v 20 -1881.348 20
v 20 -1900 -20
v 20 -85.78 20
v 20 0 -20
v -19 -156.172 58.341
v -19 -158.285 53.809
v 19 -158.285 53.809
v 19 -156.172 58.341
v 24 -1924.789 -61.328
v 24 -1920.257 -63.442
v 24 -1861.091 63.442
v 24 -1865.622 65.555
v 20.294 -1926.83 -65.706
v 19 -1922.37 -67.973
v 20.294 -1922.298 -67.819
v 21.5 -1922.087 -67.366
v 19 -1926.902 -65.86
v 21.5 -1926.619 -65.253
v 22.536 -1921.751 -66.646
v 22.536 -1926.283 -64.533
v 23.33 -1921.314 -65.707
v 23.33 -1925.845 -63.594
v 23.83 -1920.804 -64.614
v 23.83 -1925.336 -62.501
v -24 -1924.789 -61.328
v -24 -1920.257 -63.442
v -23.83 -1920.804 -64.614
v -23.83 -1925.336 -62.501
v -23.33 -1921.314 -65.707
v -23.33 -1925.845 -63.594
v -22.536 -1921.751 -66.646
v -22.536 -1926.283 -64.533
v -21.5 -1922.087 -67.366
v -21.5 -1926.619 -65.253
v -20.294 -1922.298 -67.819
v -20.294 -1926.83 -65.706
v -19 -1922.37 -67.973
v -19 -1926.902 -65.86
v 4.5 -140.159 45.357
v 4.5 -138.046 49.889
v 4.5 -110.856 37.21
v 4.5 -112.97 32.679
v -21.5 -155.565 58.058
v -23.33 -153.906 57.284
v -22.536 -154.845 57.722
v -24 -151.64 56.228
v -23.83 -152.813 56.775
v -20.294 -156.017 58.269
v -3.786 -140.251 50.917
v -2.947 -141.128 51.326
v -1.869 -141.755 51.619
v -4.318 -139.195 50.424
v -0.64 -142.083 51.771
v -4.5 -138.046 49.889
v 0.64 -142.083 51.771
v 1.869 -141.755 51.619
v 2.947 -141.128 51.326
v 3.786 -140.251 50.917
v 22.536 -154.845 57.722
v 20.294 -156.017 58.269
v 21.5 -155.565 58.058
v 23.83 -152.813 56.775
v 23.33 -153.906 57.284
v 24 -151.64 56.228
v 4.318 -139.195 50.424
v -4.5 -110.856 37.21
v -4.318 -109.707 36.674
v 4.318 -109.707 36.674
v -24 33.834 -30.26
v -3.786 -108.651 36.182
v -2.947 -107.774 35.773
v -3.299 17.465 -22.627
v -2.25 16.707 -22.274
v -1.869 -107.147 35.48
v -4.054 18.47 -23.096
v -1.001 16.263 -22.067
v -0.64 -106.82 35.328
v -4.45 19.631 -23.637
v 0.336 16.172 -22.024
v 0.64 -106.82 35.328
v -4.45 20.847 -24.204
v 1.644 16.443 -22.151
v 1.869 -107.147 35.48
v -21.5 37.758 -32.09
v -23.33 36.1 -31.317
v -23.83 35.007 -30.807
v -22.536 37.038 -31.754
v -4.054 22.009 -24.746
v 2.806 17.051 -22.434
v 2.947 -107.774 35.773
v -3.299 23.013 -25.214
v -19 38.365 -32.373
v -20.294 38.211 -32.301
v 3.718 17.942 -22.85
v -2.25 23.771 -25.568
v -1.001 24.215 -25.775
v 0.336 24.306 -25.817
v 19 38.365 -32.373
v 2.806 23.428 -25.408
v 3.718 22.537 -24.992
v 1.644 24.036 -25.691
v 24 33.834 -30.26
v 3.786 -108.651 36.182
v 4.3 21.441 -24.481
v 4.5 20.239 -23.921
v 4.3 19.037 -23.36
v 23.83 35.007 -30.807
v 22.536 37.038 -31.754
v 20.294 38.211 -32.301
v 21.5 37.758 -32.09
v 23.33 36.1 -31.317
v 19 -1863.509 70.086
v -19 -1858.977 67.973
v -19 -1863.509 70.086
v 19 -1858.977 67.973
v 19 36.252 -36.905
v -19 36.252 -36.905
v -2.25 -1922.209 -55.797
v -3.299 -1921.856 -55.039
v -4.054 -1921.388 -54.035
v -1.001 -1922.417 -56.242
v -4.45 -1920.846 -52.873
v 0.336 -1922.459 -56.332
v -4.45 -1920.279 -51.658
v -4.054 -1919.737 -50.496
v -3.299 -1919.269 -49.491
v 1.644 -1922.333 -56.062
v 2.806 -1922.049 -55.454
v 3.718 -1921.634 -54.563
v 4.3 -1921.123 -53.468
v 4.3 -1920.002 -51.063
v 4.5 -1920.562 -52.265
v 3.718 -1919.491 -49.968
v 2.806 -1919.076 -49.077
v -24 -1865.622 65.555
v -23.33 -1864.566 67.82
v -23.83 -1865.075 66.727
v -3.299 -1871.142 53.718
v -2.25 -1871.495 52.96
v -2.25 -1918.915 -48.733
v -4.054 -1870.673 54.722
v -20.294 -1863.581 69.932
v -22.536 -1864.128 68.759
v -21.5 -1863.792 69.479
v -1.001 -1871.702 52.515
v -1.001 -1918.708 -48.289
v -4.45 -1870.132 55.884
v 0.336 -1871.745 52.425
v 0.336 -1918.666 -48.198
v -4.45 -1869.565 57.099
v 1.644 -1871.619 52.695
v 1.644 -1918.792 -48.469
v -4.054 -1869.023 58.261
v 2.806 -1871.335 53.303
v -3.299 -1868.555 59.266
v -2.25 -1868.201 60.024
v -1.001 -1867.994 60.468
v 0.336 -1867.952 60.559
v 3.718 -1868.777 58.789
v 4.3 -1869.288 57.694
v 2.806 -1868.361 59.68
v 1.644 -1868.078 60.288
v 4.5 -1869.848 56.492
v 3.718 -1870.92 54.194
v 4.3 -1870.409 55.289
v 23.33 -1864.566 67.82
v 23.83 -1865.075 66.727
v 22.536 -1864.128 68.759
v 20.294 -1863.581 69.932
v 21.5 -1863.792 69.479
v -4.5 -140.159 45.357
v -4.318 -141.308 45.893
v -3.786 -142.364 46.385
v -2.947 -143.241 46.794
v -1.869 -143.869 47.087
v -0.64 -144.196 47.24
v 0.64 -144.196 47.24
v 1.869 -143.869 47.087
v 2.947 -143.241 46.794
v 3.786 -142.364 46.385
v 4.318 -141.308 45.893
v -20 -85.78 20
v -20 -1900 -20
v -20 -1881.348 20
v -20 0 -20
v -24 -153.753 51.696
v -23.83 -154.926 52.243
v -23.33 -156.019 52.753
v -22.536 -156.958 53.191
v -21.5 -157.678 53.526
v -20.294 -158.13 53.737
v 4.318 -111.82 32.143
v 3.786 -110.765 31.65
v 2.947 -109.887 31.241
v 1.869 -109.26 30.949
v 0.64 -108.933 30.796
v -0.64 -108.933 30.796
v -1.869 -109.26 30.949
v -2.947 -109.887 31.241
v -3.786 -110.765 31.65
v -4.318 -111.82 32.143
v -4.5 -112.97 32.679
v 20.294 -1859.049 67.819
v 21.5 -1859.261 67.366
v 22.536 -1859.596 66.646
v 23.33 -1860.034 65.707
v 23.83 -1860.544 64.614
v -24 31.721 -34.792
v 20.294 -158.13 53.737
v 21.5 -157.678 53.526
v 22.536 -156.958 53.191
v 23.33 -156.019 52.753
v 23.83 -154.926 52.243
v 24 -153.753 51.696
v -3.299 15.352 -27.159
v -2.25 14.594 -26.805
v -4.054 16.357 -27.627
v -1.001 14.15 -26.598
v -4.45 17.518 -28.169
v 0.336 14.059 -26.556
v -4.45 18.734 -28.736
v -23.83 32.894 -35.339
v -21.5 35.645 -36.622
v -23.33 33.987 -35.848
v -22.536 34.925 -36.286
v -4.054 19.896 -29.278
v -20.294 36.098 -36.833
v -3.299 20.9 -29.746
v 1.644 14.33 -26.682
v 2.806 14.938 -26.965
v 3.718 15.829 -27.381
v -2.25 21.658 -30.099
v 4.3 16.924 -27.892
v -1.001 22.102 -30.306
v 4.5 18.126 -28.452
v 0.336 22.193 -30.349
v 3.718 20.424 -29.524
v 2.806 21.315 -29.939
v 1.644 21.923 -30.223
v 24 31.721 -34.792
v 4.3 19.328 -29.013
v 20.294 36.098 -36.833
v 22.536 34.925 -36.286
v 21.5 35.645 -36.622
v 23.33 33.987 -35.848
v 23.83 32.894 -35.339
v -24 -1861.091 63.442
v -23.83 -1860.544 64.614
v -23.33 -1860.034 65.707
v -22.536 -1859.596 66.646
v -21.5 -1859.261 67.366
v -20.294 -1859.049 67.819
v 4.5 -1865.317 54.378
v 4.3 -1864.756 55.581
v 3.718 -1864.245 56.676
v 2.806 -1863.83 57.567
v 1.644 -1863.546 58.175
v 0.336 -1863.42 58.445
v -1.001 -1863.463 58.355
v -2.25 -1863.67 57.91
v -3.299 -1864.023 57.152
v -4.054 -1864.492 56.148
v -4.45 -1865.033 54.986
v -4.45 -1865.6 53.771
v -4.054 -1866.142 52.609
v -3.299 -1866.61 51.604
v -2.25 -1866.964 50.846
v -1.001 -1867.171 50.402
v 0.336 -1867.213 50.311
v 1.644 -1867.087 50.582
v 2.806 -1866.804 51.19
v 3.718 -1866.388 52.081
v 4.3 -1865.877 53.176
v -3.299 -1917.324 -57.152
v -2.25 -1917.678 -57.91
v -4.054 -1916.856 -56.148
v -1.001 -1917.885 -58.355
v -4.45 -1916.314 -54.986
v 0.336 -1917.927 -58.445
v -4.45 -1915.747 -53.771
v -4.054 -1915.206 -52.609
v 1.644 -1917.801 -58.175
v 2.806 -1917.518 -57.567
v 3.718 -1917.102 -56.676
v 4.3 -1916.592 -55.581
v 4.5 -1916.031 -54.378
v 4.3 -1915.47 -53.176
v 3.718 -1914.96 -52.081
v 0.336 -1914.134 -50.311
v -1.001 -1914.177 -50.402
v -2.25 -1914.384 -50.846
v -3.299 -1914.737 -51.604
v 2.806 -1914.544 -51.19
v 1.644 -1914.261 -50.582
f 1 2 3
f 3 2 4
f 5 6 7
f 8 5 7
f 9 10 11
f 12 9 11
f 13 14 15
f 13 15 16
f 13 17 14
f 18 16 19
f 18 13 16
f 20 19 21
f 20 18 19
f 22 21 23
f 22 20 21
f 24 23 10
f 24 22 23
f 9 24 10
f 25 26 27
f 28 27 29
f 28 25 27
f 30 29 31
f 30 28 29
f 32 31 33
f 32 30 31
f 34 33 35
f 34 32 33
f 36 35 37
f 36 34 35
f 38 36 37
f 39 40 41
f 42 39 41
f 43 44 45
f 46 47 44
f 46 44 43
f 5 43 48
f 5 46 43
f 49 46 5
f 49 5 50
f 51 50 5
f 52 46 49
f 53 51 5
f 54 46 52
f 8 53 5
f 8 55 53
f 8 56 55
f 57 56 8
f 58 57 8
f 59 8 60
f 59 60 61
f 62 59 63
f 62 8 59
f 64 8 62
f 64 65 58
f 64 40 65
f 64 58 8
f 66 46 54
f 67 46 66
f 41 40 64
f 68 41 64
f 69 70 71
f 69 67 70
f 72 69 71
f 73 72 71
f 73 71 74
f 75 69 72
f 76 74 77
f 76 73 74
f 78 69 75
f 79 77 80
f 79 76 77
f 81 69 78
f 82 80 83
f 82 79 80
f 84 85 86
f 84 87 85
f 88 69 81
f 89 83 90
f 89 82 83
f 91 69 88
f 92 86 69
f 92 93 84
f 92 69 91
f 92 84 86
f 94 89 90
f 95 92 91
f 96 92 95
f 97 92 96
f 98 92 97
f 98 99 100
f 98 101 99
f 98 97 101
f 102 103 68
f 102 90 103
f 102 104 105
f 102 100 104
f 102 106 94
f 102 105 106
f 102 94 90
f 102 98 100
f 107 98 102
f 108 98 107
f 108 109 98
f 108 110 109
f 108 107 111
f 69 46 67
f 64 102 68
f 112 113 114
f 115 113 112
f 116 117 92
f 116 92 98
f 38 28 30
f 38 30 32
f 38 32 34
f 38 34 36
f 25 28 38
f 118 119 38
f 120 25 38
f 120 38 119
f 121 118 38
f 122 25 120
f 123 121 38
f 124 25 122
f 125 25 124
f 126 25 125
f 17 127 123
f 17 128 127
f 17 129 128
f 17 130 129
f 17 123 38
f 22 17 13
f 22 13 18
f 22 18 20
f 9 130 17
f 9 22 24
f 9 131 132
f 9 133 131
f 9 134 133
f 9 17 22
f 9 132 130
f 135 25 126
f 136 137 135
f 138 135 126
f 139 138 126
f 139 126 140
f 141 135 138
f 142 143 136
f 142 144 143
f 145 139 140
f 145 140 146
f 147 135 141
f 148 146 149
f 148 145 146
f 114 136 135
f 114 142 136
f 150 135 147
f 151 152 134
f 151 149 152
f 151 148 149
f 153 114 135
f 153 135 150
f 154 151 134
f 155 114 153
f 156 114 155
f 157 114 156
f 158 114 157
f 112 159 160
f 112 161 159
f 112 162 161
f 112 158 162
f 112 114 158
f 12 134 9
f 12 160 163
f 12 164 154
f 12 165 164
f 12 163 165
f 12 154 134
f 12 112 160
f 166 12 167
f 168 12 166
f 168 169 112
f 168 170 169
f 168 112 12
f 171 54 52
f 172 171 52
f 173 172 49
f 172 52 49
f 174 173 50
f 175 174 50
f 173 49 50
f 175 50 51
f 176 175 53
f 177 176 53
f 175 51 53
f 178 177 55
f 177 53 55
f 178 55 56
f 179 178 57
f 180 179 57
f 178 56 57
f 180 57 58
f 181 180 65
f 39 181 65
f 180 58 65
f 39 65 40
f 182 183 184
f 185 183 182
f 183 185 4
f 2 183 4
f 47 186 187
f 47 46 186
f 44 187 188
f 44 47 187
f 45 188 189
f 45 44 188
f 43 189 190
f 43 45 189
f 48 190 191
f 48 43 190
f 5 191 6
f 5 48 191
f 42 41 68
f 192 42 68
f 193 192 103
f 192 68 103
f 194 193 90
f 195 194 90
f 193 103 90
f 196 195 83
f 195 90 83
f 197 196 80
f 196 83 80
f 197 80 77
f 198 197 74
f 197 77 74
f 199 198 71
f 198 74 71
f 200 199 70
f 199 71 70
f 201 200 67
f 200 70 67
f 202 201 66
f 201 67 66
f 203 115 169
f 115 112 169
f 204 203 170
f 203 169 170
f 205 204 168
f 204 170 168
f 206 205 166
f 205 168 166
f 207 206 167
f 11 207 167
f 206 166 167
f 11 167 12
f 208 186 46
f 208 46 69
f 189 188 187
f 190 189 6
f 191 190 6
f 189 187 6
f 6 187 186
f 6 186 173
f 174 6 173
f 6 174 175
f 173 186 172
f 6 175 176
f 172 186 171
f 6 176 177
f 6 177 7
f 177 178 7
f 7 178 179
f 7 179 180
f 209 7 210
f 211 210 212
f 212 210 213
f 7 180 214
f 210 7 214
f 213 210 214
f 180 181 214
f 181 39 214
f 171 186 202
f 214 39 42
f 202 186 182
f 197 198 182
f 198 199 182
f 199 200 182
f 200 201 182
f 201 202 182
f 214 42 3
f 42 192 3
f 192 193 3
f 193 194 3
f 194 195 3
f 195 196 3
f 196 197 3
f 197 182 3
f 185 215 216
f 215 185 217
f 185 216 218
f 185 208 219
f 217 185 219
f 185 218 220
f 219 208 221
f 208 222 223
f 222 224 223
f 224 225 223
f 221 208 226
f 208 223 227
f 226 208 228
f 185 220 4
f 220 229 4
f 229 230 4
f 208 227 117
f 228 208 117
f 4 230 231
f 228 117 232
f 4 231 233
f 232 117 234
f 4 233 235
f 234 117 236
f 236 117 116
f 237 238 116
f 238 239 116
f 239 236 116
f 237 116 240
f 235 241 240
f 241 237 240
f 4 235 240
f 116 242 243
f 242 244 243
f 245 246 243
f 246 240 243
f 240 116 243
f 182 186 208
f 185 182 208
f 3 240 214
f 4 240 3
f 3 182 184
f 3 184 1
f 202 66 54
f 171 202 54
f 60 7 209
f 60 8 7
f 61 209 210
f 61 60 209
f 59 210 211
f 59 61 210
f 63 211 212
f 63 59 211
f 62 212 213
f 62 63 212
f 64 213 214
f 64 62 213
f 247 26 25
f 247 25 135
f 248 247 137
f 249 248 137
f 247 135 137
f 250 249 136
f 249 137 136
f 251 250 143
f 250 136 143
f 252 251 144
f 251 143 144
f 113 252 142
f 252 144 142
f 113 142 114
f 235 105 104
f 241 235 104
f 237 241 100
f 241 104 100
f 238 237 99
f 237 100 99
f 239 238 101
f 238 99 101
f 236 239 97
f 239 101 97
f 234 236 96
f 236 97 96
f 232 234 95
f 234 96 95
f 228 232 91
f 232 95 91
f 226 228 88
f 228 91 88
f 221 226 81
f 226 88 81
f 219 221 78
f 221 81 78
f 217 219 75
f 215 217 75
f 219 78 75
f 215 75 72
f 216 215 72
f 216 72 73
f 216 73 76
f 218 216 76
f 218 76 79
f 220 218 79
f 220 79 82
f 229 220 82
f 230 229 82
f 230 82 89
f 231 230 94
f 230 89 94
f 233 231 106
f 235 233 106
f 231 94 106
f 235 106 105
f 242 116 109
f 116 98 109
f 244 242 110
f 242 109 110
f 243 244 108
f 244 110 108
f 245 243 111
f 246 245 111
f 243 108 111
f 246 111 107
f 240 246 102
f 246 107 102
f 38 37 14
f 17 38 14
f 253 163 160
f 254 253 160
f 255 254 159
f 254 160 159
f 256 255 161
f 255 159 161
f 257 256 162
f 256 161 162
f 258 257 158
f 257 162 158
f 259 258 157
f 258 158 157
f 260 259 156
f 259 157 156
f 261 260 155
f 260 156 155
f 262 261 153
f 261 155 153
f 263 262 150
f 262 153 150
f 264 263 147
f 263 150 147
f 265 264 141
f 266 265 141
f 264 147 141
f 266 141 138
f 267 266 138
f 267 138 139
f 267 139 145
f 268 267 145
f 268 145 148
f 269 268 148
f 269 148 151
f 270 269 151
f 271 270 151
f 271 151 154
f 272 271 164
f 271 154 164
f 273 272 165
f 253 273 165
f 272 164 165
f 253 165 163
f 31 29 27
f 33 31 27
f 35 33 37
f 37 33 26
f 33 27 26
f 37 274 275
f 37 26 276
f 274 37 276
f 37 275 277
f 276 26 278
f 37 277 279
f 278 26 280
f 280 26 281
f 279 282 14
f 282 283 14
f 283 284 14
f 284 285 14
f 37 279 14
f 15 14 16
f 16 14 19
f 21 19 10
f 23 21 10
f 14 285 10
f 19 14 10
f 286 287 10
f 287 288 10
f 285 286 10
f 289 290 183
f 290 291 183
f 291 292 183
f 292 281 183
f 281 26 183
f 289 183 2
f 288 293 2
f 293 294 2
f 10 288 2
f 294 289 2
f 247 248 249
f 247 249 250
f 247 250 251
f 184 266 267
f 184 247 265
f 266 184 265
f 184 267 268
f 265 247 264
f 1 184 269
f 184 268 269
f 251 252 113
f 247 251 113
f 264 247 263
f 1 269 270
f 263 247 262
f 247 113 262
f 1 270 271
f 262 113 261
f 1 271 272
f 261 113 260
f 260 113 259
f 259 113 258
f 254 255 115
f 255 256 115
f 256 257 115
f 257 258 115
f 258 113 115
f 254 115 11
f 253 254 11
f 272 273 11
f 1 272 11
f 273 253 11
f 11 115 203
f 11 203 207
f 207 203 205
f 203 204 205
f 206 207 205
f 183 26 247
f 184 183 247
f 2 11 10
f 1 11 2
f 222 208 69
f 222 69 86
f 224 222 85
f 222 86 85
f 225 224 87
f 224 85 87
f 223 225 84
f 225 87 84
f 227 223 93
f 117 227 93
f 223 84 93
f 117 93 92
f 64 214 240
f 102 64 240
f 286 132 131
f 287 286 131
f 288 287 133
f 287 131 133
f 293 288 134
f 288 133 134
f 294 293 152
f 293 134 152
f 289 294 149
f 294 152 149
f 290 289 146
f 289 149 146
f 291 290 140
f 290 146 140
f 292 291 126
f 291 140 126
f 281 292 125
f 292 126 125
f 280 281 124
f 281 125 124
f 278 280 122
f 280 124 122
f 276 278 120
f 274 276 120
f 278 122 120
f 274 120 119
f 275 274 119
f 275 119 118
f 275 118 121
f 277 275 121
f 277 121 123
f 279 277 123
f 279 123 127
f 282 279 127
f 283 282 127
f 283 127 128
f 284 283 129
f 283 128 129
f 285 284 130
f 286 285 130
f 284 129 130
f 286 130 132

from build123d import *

# Parameters (mm, degrees)
F0_W      = 40
F0_H      = 40
F1_DEPTH  = 1900
F3_DEPTH  = 40.001
F4_W      = 48
F4_H      = 214.6480633261
F5_DEPTH  = 5
F6_W      = 48
F6_H      = 150
F7_DEPTH  = 5
F8_R      = 4.5
F9_DEPTH  = 5
F10_R     = 4.5
F11_DEPTH = 5
F12_R     = 5


with BuildPart() as f1:
    # F0 (on Front) → F1 (new body)
    with BuildSketch(Plane.XZ):
        Rectangle(F0_W, F0_H)
    extrude(amount=F1_DEPTH)

    # F2 (on face) → F3 (cut, through all)
    with BuildSketch(Plane(origin=(-20, 0, 0), x_dir=(0, -1, 0), z_dir=(-1, 0, 0))):
        Polygon((85.7802768204, 20), (0, 20), (0, -20), align=None)
        Polygon((1900, -20), (1900, 20), (1881.3476936738, 20), align=None)
    extrude(amount=-F3_DEPTH, mode=Mode.SUBTRACT)

    # F4 (on face) → F5 (join)
    with BuildSketch(Plane(origin=(0, -7.6604444312, -16.4278760969), x_dir=(1, 0, 0), z_dir=(0, 0.4226182617, 0.906307787))):
        with Locations((0, -58.8716664282)):
            Rectangle(F4_W, F4_H)
    extrude(amount=F5_DEPTH)

    # F6 (on face) → F7 (join)
    with BuildSketch(Plane(origin=(0, -1552.987784771, 724.1700970599), x_dir=(1, 0, 0), z_dir=(0, -0.906307787, 0.4226182617))):
        with Locations((0, -799.0332946688)):
            Rectangle(F6_W, F6_H)
    extrude(amount=F7_DEPTH)

    # F8 (on face) → F9 (cut, through all)
    with BuildSketch(Plane(origin=(0, -1557.5193237062, 726.2831883686), x_dir=(1, 0, 0), z_dir=(0, -0.906307787, 0.4226182617))):
        with Locations((0, -859.0332946688)):
            Circle(F8_R)
        with Locations((0, -739.0332946688)):
            Circle(F8_R)
    extrude(amount=-F9_DEPTH, mode=Mode.SUBTRACT)

    # F10 (on face) → F11 (cut, through all)
    with BuildSketch(Plane(origin=(0, -5.5473531225, -11.8963371617), x_dir=(1, 0, 0), z_dir=(0, 0.4226182617, 0.906307787))):
        with Locations((0, 28.4523652348)):
            Circle(F10_R)
        with BuildLine():
            Line((-4.5, -146.1956980913), (4.5, -146.1956980913))
            ThreePointArc((4.5, -146.1956980913), (0, -141.6956980913), (-4.5, -146.1956980913))
        make_face()
        with BuildLine():
            ThreePointArc((-4.5, -146.1956980913), (0, -150.6956980913), (4.5, -146.1956980913))
            Line((4.5, -146.1956980913), (-4.5, -146.1956980913))
        make_face()
        with BuildLine():
            ThreePointArc((-4.5, -146.1956980913), (0, -141.6956980913), (4.5, -146.1956980913))
            Line((4.5, -146.1956980913), (4.5, -116.1956980913))
            Line((4.5, -116.1956980913), (-4.5, -116.1956980913))
            Line((-4.5, -116.1956980913), (-4.5, -146.1956980913))
        make_face()
        with BuildLine():
            Line((-4.5, -116.1956980913), (4.5, -116.1956980913))
            ThreePointArc((4.5, -116.1956980913), (0, -111.6956980913), (-4.5, -116.1956980913))
        make_face()
    extrude(amount=-F11_DEPTH, mode=Mode.SUBTRACT)

    # F12
    f12_edges = [f1.edges().sort_by_distance(p)[0] for p in [
        (-24, 37.308857, -34.638961),
        (-24, -157.228354, 56.07523),
        (24, 37.308857, -34.638961),
        (24, -157.228354, 56.07523),
        (-24, -1924.635986, -66.916538),
        (24, -1924.635986, -66.916538),
        (24, -1861.243247, 69.02963),
        (-24, -1861.243247, 69.02963),
    ]]
    fillet(f12_edges, radius=F12_R)


solid = f1.part
